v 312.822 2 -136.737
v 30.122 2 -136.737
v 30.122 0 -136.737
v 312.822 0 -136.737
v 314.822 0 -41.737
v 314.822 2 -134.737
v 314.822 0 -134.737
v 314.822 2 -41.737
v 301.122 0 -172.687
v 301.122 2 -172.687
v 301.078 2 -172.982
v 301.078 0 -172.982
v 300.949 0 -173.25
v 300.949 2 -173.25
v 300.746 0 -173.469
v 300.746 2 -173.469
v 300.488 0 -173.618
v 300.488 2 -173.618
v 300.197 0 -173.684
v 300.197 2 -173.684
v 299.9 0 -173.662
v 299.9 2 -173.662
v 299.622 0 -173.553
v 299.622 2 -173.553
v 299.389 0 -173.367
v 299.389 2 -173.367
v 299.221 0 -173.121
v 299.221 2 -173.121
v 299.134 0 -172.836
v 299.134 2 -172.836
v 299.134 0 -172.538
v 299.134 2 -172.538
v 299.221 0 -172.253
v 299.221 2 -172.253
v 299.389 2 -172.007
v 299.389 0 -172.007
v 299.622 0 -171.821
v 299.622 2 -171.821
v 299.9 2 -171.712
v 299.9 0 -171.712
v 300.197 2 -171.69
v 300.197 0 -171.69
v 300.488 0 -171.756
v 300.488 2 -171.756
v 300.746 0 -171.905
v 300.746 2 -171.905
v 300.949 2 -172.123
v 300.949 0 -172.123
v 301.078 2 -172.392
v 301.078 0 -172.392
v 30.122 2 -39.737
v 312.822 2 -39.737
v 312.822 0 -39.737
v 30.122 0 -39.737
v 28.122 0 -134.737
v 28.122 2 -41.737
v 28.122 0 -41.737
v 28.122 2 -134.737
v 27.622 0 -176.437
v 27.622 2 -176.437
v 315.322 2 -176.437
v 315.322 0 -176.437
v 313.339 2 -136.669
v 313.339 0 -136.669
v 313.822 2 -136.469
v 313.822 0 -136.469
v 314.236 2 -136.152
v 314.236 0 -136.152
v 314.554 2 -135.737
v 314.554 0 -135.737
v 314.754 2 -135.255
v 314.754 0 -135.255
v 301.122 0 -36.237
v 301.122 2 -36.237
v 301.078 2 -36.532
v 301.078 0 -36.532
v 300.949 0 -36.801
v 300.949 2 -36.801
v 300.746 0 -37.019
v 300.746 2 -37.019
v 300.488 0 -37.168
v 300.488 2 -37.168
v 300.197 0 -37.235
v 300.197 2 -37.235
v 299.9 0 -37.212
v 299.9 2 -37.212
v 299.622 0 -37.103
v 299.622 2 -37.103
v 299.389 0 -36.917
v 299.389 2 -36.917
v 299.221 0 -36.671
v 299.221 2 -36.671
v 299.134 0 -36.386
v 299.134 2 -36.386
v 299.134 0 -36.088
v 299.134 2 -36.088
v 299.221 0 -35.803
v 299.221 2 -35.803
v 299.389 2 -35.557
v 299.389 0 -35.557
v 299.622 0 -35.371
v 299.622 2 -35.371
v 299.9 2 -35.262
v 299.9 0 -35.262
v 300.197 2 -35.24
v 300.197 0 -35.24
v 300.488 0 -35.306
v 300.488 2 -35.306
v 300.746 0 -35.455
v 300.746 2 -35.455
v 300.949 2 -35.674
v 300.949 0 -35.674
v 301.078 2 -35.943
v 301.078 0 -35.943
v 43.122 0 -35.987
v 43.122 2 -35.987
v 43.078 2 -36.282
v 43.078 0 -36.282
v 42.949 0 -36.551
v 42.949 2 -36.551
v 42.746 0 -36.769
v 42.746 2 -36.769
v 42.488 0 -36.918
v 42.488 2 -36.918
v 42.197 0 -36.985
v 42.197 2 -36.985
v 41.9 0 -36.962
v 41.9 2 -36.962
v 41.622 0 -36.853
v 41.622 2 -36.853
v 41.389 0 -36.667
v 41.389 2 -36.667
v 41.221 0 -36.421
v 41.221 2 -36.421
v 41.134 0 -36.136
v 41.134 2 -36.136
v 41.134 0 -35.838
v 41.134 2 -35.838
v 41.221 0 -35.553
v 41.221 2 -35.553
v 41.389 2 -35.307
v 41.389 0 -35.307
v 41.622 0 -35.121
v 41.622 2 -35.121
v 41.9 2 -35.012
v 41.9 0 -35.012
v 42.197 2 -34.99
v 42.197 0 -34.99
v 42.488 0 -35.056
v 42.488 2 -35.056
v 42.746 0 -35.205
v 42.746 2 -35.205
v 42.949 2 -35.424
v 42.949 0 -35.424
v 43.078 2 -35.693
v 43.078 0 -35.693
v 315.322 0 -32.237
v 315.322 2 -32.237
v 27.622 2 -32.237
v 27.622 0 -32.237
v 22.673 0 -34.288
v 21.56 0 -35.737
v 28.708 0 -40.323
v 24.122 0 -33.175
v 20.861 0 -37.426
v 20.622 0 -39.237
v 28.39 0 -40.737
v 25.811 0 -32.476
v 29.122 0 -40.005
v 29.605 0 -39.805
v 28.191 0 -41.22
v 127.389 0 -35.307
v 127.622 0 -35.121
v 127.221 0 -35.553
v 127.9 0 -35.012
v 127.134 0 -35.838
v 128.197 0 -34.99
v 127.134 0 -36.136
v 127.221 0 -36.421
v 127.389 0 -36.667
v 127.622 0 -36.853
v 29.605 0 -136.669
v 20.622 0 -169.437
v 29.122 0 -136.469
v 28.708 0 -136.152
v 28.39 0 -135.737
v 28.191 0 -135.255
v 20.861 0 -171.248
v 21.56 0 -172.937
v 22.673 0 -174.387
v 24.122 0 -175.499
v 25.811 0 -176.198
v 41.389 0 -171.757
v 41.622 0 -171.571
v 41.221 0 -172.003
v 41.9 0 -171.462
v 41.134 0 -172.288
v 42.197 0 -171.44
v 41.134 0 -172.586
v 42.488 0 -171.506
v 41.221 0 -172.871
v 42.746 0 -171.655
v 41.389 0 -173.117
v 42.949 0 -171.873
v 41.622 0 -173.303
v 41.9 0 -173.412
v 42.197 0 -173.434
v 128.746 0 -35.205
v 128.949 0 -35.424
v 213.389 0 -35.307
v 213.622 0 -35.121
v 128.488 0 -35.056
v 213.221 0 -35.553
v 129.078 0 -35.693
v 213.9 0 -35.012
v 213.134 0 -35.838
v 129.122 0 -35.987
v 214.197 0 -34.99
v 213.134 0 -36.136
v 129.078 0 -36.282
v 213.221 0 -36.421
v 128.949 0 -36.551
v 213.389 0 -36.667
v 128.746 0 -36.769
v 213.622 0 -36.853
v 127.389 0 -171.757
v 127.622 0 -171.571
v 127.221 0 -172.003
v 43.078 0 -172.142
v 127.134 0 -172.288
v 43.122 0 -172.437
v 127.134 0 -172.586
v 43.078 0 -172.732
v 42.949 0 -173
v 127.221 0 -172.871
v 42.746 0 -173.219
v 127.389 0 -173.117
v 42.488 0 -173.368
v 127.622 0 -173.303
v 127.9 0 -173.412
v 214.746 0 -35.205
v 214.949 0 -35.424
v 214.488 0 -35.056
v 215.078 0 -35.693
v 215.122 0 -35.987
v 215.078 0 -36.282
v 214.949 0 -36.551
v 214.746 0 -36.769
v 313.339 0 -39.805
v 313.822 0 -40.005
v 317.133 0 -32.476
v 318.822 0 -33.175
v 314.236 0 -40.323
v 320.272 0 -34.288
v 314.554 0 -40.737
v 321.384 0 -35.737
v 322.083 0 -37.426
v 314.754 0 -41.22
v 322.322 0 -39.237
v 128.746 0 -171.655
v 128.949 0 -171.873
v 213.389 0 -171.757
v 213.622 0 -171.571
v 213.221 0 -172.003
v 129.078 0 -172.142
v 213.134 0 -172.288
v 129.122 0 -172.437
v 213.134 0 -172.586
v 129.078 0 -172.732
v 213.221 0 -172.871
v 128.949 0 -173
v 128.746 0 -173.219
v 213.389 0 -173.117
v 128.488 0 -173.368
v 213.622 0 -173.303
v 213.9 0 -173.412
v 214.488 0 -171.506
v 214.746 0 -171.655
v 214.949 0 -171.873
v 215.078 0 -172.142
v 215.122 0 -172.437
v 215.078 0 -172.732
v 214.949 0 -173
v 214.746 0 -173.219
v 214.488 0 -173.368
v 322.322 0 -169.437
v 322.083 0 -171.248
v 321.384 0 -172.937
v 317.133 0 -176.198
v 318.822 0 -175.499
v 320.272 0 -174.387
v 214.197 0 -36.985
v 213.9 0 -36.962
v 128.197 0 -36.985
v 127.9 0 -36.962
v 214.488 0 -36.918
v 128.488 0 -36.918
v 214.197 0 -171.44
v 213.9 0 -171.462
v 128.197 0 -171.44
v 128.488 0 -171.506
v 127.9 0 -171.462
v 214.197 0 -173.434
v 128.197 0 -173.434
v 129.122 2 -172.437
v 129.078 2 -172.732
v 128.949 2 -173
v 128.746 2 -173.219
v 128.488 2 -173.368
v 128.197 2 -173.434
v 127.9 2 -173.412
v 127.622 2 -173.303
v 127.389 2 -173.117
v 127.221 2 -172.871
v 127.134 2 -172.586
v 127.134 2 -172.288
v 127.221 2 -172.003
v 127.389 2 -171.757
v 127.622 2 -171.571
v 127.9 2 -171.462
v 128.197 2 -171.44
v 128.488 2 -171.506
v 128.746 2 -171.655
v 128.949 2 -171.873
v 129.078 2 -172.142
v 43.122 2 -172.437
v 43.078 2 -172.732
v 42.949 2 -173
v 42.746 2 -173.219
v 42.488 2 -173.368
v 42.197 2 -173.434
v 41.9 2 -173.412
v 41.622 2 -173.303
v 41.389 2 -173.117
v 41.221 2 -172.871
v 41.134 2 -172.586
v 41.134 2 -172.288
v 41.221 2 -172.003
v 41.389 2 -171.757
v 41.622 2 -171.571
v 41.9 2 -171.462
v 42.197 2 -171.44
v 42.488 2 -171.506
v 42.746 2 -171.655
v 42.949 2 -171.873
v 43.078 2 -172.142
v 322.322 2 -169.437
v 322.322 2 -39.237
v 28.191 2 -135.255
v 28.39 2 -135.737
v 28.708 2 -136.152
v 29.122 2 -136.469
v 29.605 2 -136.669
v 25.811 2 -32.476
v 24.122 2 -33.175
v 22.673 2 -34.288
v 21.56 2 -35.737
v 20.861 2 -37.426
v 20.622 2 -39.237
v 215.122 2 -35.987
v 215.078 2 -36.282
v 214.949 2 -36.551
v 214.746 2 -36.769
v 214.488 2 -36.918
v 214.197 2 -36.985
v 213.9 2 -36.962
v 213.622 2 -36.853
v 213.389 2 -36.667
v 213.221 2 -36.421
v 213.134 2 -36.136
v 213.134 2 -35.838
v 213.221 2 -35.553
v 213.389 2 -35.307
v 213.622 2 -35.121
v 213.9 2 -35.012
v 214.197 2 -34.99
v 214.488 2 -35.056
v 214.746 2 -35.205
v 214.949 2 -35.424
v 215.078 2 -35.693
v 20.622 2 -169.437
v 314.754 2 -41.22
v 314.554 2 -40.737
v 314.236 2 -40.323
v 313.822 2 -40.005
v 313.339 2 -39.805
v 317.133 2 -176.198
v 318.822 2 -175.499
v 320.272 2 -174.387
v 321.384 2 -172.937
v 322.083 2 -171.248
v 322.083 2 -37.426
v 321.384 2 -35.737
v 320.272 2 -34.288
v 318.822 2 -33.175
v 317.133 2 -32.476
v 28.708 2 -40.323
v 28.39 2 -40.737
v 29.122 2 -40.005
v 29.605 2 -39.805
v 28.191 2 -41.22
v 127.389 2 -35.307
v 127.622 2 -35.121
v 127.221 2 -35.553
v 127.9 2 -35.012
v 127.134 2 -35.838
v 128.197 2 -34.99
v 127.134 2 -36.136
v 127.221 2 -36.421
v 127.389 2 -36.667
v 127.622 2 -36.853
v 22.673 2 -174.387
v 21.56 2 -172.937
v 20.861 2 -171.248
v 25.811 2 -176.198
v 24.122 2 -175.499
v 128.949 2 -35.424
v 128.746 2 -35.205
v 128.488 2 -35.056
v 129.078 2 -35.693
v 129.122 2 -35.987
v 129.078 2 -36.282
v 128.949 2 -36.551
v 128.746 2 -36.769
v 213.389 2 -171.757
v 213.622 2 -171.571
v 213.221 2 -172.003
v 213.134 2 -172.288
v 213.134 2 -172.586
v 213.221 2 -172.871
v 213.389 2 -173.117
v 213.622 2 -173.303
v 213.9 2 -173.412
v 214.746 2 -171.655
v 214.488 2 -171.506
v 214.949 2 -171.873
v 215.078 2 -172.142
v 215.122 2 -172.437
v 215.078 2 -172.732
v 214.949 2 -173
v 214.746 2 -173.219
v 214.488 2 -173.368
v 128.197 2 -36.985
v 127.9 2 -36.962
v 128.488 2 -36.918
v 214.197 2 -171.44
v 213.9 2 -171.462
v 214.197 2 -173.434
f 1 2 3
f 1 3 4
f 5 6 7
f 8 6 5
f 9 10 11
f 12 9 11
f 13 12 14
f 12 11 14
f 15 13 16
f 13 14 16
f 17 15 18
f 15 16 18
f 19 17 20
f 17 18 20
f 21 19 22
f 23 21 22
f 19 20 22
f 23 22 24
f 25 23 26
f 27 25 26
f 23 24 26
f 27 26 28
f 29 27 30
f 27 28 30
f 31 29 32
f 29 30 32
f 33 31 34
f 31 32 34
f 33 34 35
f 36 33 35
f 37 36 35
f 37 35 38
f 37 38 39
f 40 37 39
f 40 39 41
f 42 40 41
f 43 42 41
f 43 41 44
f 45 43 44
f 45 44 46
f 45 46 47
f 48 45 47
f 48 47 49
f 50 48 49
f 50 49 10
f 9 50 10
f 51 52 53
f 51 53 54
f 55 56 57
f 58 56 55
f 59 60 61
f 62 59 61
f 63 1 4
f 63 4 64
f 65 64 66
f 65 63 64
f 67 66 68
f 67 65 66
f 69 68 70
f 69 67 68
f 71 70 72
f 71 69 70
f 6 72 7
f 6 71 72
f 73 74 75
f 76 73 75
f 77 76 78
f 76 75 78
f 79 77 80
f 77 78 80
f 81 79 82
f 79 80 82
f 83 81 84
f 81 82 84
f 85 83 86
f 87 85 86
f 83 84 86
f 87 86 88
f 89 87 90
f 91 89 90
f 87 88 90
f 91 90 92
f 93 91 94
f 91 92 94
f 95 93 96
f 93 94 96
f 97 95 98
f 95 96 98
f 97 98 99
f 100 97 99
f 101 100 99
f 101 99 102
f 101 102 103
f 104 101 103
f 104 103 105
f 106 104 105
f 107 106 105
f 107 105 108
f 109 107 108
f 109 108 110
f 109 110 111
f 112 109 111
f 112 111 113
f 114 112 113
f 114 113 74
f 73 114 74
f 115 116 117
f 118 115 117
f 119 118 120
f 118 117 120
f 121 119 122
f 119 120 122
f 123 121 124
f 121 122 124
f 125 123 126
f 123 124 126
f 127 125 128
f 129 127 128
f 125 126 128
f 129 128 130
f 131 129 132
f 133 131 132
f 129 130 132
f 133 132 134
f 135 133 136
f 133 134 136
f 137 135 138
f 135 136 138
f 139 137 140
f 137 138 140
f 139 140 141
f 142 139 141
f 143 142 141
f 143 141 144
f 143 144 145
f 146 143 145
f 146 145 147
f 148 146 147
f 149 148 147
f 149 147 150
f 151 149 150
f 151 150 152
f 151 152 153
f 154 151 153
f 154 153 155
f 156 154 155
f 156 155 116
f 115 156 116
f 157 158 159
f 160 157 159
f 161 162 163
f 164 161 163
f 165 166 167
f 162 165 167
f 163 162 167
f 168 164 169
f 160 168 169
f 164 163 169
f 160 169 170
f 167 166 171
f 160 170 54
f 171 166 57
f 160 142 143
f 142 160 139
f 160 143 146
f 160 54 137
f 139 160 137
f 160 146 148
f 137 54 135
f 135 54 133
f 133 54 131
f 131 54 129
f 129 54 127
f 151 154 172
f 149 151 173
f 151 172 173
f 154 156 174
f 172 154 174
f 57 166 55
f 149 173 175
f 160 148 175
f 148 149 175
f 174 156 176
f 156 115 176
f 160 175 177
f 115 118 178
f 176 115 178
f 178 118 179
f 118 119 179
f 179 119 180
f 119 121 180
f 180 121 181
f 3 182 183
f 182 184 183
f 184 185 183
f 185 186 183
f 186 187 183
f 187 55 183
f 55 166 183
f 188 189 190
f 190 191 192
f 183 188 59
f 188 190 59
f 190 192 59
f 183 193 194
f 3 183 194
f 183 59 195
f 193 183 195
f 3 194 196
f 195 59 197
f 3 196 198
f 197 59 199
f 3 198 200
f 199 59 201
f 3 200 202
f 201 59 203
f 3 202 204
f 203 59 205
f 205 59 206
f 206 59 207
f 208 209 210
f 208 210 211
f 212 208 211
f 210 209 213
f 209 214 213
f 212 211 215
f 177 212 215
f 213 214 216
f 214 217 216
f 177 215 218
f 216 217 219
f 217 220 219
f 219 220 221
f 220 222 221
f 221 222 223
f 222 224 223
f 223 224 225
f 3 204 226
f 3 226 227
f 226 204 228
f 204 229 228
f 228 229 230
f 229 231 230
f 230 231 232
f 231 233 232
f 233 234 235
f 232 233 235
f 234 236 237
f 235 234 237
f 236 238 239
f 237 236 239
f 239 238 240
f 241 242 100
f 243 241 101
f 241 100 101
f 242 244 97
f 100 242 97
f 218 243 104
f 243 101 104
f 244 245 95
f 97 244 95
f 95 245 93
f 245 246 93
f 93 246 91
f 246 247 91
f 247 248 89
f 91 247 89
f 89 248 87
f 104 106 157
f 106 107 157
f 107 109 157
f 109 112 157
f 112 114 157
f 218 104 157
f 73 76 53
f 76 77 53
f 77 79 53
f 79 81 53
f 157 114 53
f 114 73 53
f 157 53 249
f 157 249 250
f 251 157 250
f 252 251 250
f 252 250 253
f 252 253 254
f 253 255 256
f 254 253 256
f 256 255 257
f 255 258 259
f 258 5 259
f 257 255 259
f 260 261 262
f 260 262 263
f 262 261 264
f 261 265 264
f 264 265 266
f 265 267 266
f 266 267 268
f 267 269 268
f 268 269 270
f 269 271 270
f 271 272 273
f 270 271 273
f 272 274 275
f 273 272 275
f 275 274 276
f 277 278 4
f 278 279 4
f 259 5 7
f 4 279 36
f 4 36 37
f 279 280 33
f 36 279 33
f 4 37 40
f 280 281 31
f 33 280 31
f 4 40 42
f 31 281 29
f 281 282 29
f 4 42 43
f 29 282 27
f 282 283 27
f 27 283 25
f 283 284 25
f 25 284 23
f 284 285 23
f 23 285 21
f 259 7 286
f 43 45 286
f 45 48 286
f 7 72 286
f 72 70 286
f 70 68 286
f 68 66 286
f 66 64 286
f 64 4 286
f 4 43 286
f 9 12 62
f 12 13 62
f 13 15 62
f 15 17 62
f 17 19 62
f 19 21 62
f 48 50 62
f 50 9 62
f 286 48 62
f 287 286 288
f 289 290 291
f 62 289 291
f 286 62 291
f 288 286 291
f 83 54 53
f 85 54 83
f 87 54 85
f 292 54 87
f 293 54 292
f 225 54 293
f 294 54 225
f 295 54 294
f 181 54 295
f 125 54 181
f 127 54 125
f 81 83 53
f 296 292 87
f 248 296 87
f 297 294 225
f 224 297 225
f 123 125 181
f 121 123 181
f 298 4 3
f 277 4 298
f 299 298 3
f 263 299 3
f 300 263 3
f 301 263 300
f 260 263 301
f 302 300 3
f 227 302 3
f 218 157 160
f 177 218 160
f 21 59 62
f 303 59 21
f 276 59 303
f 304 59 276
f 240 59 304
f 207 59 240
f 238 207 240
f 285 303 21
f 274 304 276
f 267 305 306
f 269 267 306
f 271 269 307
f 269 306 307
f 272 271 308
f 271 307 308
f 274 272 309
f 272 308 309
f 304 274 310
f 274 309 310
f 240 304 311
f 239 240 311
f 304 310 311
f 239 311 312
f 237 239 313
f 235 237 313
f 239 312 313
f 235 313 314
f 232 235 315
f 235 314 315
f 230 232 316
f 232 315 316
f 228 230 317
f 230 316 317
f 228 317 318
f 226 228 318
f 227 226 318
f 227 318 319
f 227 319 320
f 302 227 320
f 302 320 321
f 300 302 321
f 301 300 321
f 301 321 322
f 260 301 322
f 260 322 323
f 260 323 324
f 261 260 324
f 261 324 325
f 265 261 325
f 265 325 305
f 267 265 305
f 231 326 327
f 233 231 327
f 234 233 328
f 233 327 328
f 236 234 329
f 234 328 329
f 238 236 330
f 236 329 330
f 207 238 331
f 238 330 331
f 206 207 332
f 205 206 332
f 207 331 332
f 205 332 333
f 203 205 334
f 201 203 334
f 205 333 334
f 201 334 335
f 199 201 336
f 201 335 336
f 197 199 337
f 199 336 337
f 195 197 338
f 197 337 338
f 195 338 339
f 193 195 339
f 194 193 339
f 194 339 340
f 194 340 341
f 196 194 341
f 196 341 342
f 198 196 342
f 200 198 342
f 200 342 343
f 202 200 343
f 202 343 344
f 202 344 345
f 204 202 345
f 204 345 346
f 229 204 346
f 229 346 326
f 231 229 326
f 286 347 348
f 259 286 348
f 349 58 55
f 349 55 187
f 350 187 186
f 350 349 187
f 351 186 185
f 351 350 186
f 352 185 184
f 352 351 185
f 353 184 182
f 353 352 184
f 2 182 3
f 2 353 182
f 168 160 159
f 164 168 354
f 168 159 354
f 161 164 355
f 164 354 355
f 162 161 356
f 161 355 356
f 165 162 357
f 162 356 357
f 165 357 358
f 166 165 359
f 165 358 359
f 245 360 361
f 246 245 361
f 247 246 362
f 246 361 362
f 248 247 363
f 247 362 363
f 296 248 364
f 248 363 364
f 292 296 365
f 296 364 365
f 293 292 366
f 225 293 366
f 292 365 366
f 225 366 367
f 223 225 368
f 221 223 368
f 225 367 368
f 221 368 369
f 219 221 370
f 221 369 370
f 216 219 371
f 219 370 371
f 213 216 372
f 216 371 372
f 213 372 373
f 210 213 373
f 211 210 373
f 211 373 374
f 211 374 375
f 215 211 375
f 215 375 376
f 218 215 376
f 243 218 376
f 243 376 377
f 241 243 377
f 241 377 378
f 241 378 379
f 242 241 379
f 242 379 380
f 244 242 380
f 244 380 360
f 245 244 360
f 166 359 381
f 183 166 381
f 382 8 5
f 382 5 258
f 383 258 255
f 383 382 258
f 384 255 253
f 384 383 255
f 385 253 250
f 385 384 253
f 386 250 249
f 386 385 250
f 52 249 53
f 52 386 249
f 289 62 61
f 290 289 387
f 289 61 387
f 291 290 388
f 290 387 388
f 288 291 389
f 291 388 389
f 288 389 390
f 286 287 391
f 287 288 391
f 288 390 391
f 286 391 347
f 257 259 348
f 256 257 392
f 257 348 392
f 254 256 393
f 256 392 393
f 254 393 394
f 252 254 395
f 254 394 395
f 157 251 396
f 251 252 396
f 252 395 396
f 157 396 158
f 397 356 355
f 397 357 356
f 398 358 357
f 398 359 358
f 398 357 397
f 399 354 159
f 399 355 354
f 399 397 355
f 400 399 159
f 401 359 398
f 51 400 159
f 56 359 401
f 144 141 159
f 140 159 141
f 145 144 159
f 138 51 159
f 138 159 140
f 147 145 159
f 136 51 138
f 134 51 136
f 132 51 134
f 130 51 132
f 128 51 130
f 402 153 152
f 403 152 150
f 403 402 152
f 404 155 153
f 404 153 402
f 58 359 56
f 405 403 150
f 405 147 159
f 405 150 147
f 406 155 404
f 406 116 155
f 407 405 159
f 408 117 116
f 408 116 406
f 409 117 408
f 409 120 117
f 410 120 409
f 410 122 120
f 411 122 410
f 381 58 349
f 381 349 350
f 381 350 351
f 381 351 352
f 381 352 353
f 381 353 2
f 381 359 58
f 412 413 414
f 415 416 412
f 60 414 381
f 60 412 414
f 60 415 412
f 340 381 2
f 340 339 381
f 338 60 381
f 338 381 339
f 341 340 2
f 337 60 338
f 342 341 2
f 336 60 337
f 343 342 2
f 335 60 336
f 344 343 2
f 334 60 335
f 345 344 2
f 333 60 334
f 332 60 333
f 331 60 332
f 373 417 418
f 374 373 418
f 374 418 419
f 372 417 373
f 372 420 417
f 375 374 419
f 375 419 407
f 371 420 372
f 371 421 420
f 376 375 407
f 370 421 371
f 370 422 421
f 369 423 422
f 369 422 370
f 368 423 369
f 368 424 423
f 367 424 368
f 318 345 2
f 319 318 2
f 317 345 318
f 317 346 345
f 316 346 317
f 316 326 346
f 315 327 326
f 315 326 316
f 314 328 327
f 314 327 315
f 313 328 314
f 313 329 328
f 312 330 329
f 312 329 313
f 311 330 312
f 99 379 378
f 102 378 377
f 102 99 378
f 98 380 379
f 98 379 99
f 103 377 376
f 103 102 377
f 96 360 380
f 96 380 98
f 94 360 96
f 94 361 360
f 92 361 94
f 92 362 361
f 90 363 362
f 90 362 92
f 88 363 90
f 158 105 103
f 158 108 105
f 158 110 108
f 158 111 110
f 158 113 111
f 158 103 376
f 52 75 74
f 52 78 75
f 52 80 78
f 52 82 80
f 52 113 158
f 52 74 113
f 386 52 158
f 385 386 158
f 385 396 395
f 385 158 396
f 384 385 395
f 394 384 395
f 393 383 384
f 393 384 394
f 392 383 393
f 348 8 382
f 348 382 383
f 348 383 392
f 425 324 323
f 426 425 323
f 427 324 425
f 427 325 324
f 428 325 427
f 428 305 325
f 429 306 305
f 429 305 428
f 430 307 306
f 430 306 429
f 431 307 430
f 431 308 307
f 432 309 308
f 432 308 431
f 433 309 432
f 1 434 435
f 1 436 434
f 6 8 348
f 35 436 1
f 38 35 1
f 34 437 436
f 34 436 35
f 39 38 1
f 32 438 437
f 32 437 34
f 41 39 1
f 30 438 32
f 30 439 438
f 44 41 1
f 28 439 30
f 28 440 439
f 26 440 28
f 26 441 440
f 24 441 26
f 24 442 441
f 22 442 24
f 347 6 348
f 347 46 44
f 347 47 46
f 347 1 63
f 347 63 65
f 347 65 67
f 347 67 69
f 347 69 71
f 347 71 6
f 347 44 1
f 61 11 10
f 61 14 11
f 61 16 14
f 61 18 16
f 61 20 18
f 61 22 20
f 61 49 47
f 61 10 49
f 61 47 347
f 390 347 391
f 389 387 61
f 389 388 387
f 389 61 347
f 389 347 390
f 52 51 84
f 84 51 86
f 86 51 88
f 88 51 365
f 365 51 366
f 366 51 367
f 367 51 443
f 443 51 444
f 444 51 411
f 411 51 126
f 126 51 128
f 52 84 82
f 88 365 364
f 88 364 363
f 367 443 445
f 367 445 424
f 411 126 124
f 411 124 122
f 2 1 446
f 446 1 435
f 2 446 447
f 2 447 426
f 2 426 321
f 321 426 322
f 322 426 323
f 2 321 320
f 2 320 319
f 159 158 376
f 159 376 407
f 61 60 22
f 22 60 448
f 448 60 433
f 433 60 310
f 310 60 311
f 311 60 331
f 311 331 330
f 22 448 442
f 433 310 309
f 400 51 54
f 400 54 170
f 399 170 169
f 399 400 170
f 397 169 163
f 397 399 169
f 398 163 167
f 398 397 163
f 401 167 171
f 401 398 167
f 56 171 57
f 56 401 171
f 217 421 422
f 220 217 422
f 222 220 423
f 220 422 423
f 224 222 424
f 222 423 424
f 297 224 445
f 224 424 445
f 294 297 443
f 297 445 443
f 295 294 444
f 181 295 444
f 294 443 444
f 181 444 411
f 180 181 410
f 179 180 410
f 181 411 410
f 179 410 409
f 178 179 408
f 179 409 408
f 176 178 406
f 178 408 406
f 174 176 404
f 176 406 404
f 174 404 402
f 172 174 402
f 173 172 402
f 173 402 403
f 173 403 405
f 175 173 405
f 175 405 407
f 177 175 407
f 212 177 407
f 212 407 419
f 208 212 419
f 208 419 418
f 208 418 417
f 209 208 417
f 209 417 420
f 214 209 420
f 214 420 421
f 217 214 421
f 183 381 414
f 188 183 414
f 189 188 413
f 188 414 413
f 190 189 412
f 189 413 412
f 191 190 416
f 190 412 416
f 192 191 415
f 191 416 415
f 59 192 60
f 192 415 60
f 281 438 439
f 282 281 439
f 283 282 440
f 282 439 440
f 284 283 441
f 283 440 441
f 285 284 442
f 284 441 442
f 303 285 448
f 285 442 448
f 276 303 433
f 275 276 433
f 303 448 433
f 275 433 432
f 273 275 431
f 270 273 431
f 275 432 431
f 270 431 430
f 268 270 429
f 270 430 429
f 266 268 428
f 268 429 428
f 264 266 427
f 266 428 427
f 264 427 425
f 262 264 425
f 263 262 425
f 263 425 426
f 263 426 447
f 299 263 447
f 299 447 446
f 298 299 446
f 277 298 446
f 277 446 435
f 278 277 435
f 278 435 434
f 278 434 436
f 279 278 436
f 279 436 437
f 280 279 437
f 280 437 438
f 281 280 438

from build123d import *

# Parameters (mm, degrees)
SKETCH1_W           = 350
SKETCH1_H           = 250
BOSS_EXTRUDE1_DEPTH = 2
SKETCH2_OUTSIDE_W   = 438.024
SKETCH2_OUTSIDE_H   = 338.024
SKETCH2_OUTSIDE_R   = 1
CUT_EXTRUDE1_DEPTH  = 10


with BuildPart() as part:
    # Sketch1 → Boss-Extrude1 (new body)
    with BuildSketch(Plane(origin=(0, 0, 0), x_dir=(1, 0, 0), z_dir=(0, 1, 0))):
        with Locations((175, 125)):
            Rectangle(SKETCH1_W, SKETCH1_H)
    extrude(amount=BOSS_EXTRUDE1_DEPTH)

    # Sketch2 outside → Cut-Extrude1 (cut)
    with BuildSketch(Plane(origin=(0, 2, 0), x_dir=(1, 0, 0), z_dir=(0, 1, 0))):
        with Locations((175, 125)):
            Rectangle(SKETCH2_OUTSIDE_W, SKETCH2_OUTSIDE_H)
        with BuildLine():
            Line((20.622413462, 39.237304679), (20.622413462, 169.436764679))
            ThreePointArc((20.622413462, 169.436764679), (22.672665993, 174.386512147), (27.622413462, 176.436764679))
            Line((27.622413462, 176.436764679), (315.321763462, 176.436764679))
            ThreePointArc((315.321763462, 176.436764679), (320.27151093, 174.386512147), (322.321763462, 169.436764679))
            Line((322.321763462, 169.436764679), (322.321763462, 39.237304679))
            ThreePointArc((322.321763462, 39.237304679), (320.27151093, 34.28755721), (315.321763462, 32.237304679))
            Line((315.321763462, 32.237304679), (27.622413462, 32.237304679))
            ThreePointArc((27.622413462, 32.237304679), (22.672665993, 34.28755721), (20.622413462, 39.237304679))
        make_face(mode=Mode.SUBTRACT)
        with Locations((42.122413462, 172.436764679)):
            Circle(SKETCH2_OUTSIDE_R)
        with Locations((128.122413462, 172.436764679)):
            Circle(SKETCH2_OUTSIDE_R)
        with Locations((214.122413462, 172.436764679)):
            Circle(SKETCH2_OUTSIDE_R)
        with Locations((300.122413462, 172.686764679)):
            Circle(SKETCH2_OUTSIDE_R)
        with Locations((300.122413462, 36.237304679)):
            Circle(SKETCH2_OUTSIDE_R)
        with Locations((214.122413462, 35.987304679)):
            Circle(SKETCH2_OUTSIDE_R)
        with Locations((128.122413462, 35.987304679)):
            Circle(SKETCH2_OUTSIDE_R)
        with Locations((42.122413462, 35.987304679)):
            Circle(SKETCH2_OUTSIDE_R)
        with BuildLine():
            Line((312.821763462, 39.737304679), (30.122413462, 39.737304679))
            ThreePointArc((30.122413462, 39.737304679), (28.708199899, 40.323091116), (28.122413462, 41.737304679))
            Line((28.122413462, 41.737304679), (28.122413462, 134.737304679))
            ThreePointArc((28.122413462, 134.737304679), (28.708199899, 136.151518241), (30.122413462, 136.737304679))
            Line((30.122413462, 136.737304679), (312.821763462, 136.737304679))
            ThreePointArc((312.821763462, 136.737304679), (314.235977024, 136.151518241), (314.821763462, 134.737304679))
            Line((314.821763462, 134.737304679), (314.821763462, 41.737304679))
            ThreePointArc((314.821763462, 41.737304679), (314.235977024, 40.323091116), (312.821763462, 39.737304679))
        make_face()
    extrude(amount=-CUT_EXTRUDE1_DEPTH, mode=Mode.SUBTRACT)


solid = part.part
